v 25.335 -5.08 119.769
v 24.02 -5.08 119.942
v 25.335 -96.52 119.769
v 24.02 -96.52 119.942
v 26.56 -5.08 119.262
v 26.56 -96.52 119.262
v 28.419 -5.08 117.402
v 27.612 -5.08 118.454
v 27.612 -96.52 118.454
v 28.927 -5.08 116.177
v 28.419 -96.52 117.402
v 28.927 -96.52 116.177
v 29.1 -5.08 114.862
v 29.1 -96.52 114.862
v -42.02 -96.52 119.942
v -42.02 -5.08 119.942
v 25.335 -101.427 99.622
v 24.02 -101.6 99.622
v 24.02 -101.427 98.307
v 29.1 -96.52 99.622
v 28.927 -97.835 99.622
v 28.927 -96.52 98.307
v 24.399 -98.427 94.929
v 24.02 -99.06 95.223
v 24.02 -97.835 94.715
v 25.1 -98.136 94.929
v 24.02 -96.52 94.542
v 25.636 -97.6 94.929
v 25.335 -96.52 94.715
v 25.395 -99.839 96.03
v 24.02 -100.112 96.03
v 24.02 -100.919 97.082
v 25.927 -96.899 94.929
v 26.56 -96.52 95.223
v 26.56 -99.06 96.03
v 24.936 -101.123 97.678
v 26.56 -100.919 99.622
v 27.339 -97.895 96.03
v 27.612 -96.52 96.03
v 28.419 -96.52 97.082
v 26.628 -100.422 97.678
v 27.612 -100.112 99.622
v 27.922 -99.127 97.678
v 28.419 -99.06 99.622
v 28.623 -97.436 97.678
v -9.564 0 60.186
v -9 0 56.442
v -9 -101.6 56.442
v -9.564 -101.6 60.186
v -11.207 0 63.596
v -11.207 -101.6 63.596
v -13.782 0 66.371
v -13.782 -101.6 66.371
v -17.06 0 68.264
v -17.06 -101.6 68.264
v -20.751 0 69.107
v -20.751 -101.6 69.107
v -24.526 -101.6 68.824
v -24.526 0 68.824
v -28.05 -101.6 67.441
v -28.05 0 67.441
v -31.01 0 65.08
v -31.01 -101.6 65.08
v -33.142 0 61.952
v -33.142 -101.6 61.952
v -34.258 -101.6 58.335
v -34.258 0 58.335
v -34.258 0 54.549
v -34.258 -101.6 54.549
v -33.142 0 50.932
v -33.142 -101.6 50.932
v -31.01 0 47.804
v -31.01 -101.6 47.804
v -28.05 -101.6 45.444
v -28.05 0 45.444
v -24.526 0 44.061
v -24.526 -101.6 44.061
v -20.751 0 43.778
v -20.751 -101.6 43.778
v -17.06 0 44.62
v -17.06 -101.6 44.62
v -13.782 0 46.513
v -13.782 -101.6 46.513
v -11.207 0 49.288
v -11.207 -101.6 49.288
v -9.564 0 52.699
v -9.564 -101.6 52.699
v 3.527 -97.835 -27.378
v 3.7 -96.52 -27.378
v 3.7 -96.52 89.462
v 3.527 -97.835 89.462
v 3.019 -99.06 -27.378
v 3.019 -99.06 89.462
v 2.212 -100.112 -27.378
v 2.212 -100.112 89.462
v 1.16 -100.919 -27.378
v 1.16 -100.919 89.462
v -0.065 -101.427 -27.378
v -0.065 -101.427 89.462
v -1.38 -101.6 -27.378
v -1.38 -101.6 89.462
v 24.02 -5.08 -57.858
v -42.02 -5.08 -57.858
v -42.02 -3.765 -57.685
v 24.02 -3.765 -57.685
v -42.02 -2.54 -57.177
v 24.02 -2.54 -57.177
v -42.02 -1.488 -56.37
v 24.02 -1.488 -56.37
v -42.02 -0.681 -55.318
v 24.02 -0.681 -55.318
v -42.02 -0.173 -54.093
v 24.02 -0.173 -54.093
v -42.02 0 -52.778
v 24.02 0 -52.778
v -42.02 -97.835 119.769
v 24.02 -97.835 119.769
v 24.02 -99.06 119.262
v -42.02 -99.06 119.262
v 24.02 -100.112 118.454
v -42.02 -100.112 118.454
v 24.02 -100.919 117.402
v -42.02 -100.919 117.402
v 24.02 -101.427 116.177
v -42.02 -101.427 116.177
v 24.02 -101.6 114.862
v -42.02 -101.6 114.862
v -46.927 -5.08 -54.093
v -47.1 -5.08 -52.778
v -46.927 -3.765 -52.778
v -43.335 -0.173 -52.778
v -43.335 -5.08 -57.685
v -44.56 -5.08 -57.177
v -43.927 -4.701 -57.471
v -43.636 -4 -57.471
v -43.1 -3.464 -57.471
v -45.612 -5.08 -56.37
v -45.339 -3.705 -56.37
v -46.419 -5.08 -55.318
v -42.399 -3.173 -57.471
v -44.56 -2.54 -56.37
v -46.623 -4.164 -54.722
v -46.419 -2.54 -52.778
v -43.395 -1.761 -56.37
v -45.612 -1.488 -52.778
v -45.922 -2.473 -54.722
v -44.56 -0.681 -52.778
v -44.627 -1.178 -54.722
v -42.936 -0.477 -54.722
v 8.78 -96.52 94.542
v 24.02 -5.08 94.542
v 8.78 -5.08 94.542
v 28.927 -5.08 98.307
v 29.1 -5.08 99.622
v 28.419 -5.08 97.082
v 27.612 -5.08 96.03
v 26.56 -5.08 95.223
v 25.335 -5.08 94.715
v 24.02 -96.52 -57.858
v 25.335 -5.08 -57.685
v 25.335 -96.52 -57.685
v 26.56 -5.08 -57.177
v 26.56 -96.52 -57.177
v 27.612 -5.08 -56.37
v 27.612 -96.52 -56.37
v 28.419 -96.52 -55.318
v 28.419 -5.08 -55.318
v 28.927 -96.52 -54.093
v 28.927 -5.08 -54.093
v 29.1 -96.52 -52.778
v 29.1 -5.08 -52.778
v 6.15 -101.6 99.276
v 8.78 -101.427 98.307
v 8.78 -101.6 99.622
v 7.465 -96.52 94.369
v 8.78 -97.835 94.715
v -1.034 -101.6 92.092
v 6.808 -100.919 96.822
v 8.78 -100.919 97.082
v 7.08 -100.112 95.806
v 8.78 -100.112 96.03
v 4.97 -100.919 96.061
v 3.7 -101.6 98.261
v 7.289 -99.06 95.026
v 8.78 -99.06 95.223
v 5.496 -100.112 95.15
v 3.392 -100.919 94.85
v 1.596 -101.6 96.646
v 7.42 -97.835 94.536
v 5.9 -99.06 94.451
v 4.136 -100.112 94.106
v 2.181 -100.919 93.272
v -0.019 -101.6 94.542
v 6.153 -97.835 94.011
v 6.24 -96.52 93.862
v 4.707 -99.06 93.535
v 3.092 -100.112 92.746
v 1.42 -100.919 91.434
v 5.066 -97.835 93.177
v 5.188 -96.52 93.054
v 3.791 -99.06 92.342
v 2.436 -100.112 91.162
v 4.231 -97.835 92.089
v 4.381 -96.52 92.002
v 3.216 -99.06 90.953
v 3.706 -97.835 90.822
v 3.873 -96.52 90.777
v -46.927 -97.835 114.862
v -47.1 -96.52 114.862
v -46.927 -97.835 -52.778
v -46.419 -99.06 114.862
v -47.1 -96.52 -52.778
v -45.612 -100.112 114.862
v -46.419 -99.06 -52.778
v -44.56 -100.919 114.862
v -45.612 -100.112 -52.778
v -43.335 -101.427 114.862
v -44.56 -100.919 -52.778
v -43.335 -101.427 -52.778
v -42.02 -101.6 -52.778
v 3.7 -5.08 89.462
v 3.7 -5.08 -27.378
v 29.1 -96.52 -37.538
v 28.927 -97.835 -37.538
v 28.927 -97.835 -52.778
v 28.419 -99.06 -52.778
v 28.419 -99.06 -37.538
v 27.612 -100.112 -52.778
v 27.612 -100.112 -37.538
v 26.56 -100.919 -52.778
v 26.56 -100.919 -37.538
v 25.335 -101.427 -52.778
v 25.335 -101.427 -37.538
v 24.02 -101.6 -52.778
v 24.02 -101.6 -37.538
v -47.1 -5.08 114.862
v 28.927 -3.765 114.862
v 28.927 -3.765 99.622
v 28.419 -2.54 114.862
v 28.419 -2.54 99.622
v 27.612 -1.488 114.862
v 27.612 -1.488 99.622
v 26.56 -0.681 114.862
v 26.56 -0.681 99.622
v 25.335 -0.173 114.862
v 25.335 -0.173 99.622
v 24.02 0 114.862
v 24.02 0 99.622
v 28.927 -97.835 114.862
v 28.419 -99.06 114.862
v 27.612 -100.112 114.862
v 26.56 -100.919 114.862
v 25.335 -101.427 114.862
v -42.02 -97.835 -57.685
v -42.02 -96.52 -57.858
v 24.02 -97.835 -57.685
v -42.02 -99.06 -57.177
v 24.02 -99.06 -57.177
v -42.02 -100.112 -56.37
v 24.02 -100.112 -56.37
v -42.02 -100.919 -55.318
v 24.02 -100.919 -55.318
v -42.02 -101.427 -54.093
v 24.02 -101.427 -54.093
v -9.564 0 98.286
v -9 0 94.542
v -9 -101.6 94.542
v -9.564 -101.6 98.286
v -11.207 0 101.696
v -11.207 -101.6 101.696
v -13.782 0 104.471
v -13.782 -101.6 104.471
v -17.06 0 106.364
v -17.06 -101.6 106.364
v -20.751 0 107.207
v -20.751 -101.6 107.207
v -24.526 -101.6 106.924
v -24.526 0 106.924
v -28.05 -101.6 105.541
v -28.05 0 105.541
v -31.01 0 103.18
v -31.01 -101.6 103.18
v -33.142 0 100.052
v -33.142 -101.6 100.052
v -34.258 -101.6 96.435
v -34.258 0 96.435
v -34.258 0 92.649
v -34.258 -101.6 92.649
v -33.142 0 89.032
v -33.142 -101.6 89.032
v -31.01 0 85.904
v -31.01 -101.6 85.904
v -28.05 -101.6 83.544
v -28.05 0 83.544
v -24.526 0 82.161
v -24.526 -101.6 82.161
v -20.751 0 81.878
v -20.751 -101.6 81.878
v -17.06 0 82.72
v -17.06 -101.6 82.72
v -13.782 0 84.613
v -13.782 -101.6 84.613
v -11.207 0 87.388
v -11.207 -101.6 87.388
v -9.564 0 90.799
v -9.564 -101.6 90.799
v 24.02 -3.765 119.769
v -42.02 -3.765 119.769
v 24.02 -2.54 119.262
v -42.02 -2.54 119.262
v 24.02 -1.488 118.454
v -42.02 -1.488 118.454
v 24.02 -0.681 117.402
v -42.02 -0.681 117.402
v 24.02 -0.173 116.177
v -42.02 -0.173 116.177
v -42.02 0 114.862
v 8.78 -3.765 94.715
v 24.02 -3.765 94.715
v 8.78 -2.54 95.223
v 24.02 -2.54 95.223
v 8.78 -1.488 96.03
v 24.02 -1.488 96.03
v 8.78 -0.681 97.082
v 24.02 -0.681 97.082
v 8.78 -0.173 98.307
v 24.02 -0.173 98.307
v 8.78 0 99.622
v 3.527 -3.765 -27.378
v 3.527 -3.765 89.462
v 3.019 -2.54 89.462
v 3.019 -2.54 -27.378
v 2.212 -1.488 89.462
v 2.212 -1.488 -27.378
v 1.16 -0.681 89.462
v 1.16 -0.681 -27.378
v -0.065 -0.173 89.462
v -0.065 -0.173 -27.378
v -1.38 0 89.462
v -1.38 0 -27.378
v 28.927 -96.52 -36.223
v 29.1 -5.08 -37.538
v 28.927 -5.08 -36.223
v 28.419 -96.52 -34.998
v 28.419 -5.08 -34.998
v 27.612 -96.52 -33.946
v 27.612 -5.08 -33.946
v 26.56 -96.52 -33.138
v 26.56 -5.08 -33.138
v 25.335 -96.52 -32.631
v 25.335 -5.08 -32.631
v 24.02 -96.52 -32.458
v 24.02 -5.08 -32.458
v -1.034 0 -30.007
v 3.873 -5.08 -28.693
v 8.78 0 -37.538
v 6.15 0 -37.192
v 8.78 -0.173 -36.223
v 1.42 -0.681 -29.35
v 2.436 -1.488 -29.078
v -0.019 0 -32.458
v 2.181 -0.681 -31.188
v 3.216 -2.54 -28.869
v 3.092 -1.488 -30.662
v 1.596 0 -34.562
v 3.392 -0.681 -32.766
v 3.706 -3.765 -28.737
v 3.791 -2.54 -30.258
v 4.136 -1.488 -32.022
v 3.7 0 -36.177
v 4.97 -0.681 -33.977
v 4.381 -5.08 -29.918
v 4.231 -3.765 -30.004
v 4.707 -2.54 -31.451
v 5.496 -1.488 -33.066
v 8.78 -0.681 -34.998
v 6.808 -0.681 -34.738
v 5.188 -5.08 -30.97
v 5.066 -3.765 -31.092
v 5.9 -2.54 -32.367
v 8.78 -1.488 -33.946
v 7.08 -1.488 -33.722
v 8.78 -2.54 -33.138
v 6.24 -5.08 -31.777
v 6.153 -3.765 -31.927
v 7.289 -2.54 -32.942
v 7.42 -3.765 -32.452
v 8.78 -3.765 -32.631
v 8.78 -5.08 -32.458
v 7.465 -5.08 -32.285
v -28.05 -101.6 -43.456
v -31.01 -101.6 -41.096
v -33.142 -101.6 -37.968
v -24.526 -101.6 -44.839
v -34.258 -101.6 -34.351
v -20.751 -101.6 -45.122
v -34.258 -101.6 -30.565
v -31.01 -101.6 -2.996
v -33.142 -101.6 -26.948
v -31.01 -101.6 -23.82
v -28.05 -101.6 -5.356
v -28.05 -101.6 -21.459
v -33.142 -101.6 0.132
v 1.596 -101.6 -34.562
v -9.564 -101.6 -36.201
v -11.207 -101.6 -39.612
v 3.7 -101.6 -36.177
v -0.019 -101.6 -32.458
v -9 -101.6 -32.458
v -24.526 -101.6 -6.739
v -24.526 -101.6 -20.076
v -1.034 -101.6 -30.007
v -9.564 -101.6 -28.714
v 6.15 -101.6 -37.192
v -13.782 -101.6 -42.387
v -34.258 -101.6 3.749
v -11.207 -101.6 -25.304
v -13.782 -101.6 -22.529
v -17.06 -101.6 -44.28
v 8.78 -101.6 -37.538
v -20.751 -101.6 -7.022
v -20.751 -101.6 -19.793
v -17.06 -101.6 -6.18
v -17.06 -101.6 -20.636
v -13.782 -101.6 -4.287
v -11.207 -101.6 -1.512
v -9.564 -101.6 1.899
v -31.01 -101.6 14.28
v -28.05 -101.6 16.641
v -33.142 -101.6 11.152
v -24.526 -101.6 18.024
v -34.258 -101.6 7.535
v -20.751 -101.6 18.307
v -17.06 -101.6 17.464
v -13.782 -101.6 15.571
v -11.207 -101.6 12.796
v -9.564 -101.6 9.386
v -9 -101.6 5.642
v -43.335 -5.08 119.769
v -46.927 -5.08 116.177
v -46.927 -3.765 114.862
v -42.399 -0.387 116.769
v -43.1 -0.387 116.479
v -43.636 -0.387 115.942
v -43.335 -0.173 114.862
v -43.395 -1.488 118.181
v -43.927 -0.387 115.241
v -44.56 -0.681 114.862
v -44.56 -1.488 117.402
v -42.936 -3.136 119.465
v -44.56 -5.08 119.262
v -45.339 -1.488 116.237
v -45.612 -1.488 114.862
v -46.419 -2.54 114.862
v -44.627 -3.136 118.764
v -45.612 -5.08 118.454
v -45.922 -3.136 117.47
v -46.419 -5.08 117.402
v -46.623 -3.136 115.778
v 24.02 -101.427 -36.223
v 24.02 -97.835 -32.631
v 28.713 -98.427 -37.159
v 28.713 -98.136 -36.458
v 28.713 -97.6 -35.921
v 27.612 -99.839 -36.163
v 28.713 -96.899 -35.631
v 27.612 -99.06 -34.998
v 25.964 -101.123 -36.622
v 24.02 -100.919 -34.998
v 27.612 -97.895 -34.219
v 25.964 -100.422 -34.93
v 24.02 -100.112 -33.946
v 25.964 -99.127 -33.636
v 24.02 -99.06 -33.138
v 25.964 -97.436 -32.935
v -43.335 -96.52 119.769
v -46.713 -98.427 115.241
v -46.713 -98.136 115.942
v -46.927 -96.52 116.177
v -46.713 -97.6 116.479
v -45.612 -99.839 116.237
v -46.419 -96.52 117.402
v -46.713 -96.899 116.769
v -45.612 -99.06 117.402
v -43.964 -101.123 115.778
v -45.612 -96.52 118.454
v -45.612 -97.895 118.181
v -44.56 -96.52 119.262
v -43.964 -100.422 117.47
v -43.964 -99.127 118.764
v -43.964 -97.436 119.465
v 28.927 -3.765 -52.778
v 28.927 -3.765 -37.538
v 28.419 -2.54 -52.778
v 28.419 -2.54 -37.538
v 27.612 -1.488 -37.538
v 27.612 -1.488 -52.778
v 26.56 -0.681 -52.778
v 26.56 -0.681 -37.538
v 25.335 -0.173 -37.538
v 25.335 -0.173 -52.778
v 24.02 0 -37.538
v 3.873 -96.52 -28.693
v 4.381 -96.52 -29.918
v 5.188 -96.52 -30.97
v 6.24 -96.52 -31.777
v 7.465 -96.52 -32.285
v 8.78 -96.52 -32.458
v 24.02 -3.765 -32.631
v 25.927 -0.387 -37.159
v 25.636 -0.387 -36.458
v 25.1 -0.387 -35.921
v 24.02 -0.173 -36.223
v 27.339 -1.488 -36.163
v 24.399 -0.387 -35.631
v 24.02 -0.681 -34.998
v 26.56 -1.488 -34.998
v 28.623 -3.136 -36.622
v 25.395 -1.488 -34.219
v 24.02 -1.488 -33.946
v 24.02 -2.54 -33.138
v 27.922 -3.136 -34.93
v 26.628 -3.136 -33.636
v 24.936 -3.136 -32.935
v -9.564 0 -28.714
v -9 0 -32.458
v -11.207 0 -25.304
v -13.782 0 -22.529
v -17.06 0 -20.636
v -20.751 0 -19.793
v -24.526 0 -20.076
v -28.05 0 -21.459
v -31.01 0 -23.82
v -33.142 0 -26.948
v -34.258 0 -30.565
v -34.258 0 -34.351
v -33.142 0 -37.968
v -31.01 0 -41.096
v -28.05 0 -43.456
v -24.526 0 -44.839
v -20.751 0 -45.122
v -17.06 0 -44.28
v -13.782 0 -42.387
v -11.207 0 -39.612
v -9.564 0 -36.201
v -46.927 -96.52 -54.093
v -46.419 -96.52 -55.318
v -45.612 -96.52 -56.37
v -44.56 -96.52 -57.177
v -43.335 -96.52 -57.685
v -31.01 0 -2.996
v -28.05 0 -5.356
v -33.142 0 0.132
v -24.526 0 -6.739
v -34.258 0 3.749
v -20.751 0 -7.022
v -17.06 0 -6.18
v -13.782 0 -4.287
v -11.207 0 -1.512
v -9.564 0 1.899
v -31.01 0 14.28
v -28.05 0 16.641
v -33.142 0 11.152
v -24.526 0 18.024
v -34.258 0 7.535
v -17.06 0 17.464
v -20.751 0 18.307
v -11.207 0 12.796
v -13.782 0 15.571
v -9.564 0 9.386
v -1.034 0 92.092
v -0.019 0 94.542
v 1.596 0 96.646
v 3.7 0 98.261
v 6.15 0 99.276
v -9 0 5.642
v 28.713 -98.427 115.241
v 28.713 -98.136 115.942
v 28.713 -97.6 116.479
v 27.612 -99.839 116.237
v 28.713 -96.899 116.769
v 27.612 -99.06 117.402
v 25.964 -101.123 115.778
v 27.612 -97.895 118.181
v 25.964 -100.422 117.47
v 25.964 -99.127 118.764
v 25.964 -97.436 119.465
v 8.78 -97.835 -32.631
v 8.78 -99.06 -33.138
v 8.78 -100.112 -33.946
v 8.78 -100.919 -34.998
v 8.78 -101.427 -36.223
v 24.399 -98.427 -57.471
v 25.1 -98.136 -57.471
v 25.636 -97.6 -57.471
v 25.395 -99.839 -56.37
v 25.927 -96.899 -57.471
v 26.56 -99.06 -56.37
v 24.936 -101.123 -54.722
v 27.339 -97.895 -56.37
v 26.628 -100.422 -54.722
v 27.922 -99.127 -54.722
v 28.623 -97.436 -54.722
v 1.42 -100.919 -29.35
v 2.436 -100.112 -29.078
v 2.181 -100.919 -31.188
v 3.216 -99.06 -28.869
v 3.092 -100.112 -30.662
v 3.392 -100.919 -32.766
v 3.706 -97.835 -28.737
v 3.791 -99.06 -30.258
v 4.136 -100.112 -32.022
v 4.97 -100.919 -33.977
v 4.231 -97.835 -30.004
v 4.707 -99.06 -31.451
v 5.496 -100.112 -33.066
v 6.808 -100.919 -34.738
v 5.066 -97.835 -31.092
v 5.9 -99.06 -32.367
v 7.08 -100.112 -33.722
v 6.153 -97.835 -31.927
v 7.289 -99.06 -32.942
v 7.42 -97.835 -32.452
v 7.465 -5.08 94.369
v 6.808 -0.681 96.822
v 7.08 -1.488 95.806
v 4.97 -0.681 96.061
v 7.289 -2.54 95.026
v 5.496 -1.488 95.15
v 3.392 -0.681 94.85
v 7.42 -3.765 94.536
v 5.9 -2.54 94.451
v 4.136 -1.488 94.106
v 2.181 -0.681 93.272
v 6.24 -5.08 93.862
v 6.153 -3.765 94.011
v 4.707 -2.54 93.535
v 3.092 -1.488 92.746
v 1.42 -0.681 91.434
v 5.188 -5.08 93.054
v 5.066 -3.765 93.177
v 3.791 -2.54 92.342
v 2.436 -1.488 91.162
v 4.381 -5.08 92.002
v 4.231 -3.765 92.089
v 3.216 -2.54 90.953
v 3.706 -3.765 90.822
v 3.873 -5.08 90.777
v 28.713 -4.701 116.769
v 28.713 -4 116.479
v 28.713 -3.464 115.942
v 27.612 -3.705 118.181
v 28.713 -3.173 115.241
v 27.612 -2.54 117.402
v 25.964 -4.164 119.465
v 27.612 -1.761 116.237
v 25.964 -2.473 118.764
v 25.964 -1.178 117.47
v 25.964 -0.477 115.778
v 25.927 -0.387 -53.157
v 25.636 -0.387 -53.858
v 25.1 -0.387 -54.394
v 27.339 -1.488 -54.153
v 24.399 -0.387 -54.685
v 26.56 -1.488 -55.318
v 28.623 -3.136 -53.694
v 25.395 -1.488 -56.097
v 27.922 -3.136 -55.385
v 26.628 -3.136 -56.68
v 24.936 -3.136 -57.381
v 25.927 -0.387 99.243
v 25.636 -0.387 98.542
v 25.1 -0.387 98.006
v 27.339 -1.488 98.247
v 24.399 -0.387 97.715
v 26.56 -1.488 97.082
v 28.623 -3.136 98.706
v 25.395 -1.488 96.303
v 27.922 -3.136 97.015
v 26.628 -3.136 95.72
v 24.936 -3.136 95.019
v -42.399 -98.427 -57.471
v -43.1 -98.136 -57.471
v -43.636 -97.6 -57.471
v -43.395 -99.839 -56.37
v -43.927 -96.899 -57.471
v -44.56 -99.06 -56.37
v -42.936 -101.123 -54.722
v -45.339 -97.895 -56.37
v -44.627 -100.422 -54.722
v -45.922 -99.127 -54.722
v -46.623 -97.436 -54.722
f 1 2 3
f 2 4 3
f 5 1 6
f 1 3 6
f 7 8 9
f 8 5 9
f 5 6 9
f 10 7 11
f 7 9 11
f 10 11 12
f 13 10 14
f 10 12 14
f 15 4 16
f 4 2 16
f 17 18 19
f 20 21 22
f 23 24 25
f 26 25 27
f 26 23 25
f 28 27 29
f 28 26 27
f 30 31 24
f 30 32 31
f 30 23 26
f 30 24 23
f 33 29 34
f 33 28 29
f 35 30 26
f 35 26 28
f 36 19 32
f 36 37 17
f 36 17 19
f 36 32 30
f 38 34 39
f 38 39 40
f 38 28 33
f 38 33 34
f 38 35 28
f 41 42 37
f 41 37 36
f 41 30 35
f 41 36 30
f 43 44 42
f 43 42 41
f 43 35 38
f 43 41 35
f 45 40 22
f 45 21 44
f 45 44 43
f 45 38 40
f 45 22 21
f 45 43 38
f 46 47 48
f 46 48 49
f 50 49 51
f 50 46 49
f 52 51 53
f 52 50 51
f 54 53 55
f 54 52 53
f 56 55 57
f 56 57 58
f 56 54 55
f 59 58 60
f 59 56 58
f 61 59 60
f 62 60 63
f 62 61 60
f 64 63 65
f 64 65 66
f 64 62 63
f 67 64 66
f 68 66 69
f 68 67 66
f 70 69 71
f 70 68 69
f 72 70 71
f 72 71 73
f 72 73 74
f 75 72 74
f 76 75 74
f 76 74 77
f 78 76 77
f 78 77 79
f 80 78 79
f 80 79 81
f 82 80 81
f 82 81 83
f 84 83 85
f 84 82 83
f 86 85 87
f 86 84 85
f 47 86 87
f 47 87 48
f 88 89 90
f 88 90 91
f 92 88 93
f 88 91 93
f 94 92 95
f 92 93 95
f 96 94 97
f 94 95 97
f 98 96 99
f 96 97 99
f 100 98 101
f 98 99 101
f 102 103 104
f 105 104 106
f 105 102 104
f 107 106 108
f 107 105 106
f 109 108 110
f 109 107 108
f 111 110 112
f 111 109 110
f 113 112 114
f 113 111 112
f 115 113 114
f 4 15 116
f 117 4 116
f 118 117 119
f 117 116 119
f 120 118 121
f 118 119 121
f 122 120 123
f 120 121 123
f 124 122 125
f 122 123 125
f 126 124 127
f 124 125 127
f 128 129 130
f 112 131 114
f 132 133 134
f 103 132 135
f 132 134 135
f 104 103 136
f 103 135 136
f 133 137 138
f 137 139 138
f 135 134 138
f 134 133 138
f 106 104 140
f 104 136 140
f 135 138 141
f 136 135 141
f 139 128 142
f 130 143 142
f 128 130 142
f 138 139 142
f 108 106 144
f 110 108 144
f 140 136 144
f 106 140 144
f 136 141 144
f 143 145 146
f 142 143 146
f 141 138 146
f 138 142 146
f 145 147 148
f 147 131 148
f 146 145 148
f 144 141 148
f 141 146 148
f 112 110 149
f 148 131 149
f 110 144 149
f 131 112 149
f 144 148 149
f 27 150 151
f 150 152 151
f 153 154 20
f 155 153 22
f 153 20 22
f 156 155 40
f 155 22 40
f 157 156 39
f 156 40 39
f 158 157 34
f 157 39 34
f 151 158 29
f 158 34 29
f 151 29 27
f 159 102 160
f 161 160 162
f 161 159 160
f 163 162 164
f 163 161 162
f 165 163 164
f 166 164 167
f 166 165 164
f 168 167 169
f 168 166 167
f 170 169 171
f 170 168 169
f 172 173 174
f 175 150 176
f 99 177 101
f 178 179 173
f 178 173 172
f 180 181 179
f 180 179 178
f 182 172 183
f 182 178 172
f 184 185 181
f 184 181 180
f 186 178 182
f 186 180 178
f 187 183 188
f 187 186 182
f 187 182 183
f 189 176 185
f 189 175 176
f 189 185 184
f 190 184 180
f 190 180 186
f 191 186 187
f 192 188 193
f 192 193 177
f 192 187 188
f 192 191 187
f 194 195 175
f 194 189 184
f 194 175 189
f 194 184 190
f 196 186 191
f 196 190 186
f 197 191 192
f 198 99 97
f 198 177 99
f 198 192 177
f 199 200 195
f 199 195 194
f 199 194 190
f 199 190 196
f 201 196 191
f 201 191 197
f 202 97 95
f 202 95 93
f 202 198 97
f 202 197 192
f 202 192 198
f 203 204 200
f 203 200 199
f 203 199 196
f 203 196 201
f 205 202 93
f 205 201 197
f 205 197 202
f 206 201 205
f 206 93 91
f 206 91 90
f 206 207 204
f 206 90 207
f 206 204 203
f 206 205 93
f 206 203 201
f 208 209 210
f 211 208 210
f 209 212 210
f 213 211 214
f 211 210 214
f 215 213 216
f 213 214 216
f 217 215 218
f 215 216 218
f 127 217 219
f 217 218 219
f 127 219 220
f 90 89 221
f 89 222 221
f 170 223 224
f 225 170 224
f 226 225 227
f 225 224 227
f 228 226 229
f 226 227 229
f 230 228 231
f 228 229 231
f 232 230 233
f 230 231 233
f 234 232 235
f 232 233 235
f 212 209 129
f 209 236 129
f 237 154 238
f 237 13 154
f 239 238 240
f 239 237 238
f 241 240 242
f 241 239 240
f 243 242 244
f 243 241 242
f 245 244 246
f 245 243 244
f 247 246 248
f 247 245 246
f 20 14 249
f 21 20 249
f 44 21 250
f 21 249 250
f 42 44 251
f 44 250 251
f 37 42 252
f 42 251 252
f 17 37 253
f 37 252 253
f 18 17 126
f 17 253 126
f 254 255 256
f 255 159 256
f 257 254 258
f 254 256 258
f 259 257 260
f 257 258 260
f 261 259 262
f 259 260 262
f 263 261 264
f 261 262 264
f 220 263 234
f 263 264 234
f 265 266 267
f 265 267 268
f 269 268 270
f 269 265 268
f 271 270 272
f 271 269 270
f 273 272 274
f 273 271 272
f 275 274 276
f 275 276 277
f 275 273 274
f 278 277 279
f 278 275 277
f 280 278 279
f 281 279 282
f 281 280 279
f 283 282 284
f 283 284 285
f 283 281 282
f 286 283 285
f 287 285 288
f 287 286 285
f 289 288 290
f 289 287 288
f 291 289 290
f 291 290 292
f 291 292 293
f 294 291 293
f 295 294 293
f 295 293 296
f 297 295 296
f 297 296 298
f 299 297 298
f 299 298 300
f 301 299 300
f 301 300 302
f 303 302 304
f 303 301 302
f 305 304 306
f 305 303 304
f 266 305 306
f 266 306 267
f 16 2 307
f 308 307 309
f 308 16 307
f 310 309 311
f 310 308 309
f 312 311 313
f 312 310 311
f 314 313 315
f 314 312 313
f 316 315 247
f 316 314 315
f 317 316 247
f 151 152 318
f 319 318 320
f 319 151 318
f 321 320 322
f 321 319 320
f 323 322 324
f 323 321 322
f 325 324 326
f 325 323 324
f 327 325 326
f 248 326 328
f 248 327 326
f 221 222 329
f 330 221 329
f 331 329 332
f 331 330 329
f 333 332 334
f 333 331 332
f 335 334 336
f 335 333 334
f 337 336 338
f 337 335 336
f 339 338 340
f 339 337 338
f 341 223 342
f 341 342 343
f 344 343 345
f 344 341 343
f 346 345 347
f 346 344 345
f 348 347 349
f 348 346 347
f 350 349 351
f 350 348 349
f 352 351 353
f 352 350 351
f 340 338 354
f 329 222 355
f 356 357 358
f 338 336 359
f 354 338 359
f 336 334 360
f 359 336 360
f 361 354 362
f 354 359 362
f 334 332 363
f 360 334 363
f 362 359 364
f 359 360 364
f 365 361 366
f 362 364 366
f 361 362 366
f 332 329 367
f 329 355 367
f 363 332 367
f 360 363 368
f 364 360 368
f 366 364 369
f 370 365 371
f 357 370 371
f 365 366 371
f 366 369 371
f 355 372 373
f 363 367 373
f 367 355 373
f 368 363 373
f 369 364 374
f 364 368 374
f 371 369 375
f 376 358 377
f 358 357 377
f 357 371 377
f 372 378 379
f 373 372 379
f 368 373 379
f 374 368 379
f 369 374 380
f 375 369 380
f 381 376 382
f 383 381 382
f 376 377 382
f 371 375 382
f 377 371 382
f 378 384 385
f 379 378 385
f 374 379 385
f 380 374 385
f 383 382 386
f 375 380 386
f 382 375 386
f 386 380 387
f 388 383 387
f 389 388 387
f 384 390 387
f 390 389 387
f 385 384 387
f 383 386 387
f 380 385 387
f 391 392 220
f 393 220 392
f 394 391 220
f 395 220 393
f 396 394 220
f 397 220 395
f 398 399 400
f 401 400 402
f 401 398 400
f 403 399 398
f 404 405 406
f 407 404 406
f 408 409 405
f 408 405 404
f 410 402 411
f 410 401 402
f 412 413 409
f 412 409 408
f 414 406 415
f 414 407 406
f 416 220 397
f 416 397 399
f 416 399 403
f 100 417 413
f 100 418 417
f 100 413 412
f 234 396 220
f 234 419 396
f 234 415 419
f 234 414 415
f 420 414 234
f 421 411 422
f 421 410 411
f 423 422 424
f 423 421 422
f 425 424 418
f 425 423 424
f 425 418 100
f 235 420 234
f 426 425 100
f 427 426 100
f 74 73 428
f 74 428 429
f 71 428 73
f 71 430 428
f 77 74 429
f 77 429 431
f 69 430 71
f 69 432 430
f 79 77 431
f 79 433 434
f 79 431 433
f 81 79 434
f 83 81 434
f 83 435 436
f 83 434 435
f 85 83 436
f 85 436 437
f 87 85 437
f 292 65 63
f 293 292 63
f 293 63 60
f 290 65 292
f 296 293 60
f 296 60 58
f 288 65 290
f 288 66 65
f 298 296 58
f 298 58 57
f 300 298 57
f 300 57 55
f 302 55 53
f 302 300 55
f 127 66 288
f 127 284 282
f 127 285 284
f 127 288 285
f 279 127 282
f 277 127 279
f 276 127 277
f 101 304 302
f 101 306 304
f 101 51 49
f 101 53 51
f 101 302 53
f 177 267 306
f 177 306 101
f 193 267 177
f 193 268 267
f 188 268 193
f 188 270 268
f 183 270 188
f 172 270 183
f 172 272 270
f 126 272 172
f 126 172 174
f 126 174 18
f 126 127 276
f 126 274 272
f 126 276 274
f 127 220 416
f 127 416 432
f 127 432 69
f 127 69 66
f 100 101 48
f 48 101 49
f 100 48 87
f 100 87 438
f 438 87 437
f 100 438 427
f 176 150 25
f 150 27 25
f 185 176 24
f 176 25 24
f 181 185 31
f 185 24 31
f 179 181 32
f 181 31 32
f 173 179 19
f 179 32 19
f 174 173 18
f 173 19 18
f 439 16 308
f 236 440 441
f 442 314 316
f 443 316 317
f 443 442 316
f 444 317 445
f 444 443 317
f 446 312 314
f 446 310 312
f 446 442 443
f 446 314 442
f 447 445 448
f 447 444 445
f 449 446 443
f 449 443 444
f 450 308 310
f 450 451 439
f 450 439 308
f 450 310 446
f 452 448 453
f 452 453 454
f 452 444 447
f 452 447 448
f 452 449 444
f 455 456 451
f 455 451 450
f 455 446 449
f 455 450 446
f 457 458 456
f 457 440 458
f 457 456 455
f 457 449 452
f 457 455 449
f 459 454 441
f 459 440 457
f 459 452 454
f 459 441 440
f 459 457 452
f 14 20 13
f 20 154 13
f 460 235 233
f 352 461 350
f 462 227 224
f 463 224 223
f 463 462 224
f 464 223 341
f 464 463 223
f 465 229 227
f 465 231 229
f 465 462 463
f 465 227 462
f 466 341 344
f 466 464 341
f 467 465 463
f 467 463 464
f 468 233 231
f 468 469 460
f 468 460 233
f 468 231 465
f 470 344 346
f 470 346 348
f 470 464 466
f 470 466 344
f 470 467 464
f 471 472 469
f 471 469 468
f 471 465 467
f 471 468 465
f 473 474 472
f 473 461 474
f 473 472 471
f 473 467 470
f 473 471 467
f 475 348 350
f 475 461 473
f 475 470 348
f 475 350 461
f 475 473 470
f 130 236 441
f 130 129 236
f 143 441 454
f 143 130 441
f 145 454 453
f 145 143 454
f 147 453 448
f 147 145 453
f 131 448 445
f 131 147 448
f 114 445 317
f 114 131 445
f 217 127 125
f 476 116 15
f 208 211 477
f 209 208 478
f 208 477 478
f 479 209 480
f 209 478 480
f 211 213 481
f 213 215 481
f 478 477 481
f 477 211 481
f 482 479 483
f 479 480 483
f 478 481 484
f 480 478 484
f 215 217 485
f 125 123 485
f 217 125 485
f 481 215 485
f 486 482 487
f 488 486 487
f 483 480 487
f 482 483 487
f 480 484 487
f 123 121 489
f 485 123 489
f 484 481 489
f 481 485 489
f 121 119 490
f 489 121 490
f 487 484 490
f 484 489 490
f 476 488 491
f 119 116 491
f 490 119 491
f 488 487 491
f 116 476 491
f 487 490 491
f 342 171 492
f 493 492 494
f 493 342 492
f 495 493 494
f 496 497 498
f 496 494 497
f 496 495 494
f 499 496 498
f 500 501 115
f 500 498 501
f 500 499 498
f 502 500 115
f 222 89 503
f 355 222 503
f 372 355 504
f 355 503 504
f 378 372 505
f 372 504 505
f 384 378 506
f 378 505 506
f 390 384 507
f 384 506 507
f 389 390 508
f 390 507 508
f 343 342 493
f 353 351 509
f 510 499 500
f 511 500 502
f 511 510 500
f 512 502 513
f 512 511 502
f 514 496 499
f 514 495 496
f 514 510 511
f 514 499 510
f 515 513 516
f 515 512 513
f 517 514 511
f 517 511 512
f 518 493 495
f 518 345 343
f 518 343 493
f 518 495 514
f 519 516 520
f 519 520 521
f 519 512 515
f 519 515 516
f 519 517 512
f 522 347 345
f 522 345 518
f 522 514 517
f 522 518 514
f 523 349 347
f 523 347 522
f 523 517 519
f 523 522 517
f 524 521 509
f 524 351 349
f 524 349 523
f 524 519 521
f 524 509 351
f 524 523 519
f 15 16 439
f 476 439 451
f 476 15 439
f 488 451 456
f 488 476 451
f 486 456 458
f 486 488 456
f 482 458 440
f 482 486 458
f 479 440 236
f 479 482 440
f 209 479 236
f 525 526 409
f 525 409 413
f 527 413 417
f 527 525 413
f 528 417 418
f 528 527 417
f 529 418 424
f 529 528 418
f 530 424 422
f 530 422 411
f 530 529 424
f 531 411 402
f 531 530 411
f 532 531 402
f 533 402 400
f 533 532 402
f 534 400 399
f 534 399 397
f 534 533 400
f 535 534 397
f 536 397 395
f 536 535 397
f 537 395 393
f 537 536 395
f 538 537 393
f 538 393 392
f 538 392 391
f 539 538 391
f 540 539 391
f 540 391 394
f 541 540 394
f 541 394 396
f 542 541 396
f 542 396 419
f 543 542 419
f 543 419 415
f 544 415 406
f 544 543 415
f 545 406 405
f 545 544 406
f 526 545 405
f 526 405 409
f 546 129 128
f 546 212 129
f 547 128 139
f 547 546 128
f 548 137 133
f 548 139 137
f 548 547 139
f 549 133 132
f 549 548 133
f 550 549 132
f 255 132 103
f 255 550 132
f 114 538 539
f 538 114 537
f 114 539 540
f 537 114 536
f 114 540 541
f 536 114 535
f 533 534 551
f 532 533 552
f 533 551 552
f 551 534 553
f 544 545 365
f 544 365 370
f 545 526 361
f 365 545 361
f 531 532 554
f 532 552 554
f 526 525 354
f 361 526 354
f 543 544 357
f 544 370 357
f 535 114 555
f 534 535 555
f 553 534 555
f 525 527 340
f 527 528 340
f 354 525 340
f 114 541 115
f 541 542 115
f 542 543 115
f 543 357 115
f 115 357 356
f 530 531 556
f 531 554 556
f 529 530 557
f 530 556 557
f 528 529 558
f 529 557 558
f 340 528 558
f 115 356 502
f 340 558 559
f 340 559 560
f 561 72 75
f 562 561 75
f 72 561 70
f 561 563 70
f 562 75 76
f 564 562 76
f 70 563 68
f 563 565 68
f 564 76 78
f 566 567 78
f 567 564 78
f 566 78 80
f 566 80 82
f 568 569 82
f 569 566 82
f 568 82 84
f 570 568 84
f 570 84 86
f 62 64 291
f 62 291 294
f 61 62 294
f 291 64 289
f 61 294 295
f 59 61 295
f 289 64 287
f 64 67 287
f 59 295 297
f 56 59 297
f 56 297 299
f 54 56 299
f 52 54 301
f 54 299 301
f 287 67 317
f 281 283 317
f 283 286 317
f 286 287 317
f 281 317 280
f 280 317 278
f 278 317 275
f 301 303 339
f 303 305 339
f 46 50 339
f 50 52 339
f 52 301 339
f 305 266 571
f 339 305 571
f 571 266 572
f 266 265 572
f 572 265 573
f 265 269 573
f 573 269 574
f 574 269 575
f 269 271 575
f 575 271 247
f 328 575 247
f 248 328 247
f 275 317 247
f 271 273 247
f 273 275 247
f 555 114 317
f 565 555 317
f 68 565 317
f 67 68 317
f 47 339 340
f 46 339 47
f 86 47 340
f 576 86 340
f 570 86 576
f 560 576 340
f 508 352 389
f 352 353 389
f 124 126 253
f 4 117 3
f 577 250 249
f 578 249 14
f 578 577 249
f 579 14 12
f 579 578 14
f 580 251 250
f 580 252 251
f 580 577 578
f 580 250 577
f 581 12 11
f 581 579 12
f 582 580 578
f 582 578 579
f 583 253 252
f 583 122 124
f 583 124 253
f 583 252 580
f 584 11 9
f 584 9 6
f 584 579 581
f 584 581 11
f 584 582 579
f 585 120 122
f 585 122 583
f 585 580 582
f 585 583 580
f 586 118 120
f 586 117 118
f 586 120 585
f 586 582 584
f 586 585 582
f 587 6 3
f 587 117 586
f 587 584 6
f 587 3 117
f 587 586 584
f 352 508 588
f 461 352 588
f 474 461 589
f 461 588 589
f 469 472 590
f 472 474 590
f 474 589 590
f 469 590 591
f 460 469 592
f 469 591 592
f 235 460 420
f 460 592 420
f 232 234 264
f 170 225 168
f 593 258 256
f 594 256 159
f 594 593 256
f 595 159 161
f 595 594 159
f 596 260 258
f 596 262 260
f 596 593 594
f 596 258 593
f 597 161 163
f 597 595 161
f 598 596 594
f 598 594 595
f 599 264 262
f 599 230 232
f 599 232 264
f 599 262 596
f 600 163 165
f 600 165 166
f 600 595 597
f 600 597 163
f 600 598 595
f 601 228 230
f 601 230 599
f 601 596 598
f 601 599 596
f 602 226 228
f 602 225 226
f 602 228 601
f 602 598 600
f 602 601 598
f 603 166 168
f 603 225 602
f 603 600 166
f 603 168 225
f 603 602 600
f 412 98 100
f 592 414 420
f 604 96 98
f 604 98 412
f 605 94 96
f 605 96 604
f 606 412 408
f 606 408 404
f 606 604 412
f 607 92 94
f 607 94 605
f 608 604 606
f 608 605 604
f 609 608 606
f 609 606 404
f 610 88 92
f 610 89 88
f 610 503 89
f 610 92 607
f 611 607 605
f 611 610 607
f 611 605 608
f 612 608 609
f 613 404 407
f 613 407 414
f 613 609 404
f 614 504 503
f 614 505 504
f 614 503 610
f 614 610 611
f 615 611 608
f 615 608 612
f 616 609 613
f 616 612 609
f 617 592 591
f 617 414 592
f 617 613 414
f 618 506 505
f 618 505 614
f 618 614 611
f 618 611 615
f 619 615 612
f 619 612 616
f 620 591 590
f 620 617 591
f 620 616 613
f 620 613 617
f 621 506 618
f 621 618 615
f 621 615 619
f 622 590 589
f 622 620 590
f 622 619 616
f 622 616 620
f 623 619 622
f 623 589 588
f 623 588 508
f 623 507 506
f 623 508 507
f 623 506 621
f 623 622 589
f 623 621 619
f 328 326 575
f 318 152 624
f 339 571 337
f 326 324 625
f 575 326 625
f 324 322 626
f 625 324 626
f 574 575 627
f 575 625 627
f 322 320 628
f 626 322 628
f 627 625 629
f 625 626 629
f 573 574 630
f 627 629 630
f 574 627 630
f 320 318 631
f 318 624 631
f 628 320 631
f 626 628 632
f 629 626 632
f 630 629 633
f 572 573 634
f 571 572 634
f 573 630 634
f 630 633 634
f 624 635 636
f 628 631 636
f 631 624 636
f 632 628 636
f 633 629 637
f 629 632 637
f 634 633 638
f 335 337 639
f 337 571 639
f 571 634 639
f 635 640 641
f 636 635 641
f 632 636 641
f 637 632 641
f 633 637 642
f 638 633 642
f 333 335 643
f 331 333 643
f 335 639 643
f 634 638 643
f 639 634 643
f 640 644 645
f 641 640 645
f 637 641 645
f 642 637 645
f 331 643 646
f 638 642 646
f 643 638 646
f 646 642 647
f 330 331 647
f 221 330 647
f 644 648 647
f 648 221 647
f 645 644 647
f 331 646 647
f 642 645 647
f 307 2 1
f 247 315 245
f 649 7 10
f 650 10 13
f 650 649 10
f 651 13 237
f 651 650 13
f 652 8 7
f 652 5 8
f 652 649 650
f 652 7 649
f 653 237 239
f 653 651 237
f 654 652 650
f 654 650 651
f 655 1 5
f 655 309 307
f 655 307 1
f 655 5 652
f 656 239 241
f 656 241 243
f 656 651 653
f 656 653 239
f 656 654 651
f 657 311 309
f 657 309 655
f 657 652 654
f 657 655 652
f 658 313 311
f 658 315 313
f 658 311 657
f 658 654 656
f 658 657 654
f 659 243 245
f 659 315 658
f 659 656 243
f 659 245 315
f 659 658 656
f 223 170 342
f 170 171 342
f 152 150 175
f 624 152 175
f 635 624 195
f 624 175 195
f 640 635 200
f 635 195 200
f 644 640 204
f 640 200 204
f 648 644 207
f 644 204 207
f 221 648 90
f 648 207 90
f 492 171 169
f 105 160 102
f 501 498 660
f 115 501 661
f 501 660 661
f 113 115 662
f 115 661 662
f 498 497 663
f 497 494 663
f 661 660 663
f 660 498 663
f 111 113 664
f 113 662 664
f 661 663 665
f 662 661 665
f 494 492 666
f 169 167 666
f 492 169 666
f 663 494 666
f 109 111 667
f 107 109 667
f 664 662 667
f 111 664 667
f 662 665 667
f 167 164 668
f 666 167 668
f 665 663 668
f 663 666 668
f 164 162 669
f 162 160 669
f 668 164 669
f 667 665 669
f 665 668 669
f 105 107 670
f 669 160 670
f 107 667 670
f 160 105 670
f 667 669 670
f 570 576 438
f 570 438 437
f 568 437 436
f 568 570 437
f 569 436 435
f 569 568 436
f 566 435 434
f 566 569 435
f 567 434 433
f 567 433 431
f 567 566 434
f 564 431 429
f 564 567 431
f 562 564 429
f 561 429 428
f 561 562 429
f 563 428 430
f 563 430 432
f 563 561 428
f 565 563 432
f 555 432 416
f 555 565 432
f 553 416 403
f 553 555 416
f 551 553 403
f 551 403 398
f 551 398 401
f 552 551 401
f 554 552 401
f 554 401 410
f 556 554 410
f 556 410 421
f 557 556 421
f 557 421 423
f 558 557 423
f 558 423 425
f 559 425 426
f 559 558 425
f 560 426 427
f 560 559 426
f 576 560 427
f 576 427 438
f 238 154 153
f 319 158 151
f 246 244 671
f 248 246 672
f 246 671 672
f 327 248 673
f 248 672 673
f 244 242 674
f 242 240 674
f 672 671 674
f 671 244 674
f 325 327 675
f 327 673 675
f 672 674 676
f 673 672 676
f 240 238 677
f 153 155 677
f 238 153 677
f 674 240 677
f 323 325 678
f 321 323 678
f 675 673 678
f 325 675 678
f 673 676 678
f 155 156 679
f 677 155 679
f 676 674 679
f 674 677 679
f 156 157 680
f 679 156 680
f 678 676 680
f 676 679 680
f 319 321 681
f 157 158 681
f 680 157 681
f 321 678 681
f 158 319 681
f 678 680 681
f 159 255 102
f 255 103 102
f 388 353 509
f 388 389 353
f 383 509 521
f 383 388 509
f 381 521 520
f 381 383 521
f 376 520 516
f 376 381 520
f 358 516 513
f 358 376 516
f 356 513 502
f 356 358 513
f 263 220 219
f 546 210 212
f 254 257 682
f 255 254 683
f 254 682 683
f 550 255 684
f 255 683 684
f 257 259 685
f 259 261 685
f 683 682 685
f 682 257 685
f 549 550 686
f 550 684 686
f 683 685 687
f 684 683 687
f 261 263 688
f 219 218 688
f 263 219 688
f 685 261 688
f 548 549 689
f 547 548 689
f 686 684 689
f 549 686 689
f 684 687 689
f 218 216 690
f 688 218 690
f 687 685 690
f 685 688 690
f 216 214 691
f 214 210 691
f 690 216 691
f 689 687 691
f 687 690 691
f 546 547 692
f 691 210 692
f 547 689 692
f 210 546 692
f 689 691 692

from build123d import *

# Parameters (mm, degrees)
F0_R     = 12.7
F1_DEPTH = 101.6
F2_R     = 5.08


with BuildPart() as f1:
    # F0 (on Front) → F1 (new body)
    with BuildSketch(Plane.XZ):
        Polygon((29.100048, 119.942114), (-47.099952, 119.942114), (-47.099952, -57.857886), (29.100048, -57.857886), (29.100048, -32.457886), (3.700048, -32.457886), (3.700048, 94.542114), (29.100048, 94.542114), align=None)
        with Locations((-21.699952, -32.457886)):
            Circle(F0_R, mode=Mode.SUBTRACT)
        with Locations((-21.699952, 5.642114)):
            Circle(F0_R, mode=Mode.SUBTRACT)
        with Locations((-21.699952, 56.442114)):
            Circle(F0_R, mode=Mode.SUBTRACT)
        with Locations((-21.699952, 94.542114)):
            Circle(F0_R, mode=Mode.SUBTRACT)
    extrude(amount=F1_DEPTH)

    # F2
    f2_edges = [f1.edges().sort_by_distance(p)[0] for p in [
        (-8.999952, -101.6, 119.942114),
        (-47.099952, -101.6, 31.042114),
        (29.100048, -101.6, 107.242114),
        (16.400048, -101.6, 94.542114),
        (3.700048, -101.6, 31.042114),
        (16.400048, -101.6, -32.457886),
        (29.100048, -101.6, -45.157886),
        (-8.999952, -101.6, -57.857886),
        (-47.099952, -50.8, 119.942114),
        (-8.999952, 0, 119.942114),
        (29.100048, -50.8, 119.942114),
        (-47.099952, 0, 31.042114),
        (-47.099952, -50.8, -57.857886),
        (29.100048, -50.8, -32.457886),
        (3.700048, -50.8, -32.457886),
        (29.100048, -50.8, 94.542114),
        (29.100048, 0, 107.242114),
        (29.100048, -50.8, -57.857886),
        (29.100048, 0, -45.157886),
        (3.700048, -50.8, 94.542114),
        (16.400048, 0, 94.542114),
        (3.700048, 0, 31.042114),
        (16.400048, 0, -32.457886),
        (-8.999952, 0, -57.857886),
    ]]
    fillet(f2_edges, radius=F2_R)


solid = f1.part
